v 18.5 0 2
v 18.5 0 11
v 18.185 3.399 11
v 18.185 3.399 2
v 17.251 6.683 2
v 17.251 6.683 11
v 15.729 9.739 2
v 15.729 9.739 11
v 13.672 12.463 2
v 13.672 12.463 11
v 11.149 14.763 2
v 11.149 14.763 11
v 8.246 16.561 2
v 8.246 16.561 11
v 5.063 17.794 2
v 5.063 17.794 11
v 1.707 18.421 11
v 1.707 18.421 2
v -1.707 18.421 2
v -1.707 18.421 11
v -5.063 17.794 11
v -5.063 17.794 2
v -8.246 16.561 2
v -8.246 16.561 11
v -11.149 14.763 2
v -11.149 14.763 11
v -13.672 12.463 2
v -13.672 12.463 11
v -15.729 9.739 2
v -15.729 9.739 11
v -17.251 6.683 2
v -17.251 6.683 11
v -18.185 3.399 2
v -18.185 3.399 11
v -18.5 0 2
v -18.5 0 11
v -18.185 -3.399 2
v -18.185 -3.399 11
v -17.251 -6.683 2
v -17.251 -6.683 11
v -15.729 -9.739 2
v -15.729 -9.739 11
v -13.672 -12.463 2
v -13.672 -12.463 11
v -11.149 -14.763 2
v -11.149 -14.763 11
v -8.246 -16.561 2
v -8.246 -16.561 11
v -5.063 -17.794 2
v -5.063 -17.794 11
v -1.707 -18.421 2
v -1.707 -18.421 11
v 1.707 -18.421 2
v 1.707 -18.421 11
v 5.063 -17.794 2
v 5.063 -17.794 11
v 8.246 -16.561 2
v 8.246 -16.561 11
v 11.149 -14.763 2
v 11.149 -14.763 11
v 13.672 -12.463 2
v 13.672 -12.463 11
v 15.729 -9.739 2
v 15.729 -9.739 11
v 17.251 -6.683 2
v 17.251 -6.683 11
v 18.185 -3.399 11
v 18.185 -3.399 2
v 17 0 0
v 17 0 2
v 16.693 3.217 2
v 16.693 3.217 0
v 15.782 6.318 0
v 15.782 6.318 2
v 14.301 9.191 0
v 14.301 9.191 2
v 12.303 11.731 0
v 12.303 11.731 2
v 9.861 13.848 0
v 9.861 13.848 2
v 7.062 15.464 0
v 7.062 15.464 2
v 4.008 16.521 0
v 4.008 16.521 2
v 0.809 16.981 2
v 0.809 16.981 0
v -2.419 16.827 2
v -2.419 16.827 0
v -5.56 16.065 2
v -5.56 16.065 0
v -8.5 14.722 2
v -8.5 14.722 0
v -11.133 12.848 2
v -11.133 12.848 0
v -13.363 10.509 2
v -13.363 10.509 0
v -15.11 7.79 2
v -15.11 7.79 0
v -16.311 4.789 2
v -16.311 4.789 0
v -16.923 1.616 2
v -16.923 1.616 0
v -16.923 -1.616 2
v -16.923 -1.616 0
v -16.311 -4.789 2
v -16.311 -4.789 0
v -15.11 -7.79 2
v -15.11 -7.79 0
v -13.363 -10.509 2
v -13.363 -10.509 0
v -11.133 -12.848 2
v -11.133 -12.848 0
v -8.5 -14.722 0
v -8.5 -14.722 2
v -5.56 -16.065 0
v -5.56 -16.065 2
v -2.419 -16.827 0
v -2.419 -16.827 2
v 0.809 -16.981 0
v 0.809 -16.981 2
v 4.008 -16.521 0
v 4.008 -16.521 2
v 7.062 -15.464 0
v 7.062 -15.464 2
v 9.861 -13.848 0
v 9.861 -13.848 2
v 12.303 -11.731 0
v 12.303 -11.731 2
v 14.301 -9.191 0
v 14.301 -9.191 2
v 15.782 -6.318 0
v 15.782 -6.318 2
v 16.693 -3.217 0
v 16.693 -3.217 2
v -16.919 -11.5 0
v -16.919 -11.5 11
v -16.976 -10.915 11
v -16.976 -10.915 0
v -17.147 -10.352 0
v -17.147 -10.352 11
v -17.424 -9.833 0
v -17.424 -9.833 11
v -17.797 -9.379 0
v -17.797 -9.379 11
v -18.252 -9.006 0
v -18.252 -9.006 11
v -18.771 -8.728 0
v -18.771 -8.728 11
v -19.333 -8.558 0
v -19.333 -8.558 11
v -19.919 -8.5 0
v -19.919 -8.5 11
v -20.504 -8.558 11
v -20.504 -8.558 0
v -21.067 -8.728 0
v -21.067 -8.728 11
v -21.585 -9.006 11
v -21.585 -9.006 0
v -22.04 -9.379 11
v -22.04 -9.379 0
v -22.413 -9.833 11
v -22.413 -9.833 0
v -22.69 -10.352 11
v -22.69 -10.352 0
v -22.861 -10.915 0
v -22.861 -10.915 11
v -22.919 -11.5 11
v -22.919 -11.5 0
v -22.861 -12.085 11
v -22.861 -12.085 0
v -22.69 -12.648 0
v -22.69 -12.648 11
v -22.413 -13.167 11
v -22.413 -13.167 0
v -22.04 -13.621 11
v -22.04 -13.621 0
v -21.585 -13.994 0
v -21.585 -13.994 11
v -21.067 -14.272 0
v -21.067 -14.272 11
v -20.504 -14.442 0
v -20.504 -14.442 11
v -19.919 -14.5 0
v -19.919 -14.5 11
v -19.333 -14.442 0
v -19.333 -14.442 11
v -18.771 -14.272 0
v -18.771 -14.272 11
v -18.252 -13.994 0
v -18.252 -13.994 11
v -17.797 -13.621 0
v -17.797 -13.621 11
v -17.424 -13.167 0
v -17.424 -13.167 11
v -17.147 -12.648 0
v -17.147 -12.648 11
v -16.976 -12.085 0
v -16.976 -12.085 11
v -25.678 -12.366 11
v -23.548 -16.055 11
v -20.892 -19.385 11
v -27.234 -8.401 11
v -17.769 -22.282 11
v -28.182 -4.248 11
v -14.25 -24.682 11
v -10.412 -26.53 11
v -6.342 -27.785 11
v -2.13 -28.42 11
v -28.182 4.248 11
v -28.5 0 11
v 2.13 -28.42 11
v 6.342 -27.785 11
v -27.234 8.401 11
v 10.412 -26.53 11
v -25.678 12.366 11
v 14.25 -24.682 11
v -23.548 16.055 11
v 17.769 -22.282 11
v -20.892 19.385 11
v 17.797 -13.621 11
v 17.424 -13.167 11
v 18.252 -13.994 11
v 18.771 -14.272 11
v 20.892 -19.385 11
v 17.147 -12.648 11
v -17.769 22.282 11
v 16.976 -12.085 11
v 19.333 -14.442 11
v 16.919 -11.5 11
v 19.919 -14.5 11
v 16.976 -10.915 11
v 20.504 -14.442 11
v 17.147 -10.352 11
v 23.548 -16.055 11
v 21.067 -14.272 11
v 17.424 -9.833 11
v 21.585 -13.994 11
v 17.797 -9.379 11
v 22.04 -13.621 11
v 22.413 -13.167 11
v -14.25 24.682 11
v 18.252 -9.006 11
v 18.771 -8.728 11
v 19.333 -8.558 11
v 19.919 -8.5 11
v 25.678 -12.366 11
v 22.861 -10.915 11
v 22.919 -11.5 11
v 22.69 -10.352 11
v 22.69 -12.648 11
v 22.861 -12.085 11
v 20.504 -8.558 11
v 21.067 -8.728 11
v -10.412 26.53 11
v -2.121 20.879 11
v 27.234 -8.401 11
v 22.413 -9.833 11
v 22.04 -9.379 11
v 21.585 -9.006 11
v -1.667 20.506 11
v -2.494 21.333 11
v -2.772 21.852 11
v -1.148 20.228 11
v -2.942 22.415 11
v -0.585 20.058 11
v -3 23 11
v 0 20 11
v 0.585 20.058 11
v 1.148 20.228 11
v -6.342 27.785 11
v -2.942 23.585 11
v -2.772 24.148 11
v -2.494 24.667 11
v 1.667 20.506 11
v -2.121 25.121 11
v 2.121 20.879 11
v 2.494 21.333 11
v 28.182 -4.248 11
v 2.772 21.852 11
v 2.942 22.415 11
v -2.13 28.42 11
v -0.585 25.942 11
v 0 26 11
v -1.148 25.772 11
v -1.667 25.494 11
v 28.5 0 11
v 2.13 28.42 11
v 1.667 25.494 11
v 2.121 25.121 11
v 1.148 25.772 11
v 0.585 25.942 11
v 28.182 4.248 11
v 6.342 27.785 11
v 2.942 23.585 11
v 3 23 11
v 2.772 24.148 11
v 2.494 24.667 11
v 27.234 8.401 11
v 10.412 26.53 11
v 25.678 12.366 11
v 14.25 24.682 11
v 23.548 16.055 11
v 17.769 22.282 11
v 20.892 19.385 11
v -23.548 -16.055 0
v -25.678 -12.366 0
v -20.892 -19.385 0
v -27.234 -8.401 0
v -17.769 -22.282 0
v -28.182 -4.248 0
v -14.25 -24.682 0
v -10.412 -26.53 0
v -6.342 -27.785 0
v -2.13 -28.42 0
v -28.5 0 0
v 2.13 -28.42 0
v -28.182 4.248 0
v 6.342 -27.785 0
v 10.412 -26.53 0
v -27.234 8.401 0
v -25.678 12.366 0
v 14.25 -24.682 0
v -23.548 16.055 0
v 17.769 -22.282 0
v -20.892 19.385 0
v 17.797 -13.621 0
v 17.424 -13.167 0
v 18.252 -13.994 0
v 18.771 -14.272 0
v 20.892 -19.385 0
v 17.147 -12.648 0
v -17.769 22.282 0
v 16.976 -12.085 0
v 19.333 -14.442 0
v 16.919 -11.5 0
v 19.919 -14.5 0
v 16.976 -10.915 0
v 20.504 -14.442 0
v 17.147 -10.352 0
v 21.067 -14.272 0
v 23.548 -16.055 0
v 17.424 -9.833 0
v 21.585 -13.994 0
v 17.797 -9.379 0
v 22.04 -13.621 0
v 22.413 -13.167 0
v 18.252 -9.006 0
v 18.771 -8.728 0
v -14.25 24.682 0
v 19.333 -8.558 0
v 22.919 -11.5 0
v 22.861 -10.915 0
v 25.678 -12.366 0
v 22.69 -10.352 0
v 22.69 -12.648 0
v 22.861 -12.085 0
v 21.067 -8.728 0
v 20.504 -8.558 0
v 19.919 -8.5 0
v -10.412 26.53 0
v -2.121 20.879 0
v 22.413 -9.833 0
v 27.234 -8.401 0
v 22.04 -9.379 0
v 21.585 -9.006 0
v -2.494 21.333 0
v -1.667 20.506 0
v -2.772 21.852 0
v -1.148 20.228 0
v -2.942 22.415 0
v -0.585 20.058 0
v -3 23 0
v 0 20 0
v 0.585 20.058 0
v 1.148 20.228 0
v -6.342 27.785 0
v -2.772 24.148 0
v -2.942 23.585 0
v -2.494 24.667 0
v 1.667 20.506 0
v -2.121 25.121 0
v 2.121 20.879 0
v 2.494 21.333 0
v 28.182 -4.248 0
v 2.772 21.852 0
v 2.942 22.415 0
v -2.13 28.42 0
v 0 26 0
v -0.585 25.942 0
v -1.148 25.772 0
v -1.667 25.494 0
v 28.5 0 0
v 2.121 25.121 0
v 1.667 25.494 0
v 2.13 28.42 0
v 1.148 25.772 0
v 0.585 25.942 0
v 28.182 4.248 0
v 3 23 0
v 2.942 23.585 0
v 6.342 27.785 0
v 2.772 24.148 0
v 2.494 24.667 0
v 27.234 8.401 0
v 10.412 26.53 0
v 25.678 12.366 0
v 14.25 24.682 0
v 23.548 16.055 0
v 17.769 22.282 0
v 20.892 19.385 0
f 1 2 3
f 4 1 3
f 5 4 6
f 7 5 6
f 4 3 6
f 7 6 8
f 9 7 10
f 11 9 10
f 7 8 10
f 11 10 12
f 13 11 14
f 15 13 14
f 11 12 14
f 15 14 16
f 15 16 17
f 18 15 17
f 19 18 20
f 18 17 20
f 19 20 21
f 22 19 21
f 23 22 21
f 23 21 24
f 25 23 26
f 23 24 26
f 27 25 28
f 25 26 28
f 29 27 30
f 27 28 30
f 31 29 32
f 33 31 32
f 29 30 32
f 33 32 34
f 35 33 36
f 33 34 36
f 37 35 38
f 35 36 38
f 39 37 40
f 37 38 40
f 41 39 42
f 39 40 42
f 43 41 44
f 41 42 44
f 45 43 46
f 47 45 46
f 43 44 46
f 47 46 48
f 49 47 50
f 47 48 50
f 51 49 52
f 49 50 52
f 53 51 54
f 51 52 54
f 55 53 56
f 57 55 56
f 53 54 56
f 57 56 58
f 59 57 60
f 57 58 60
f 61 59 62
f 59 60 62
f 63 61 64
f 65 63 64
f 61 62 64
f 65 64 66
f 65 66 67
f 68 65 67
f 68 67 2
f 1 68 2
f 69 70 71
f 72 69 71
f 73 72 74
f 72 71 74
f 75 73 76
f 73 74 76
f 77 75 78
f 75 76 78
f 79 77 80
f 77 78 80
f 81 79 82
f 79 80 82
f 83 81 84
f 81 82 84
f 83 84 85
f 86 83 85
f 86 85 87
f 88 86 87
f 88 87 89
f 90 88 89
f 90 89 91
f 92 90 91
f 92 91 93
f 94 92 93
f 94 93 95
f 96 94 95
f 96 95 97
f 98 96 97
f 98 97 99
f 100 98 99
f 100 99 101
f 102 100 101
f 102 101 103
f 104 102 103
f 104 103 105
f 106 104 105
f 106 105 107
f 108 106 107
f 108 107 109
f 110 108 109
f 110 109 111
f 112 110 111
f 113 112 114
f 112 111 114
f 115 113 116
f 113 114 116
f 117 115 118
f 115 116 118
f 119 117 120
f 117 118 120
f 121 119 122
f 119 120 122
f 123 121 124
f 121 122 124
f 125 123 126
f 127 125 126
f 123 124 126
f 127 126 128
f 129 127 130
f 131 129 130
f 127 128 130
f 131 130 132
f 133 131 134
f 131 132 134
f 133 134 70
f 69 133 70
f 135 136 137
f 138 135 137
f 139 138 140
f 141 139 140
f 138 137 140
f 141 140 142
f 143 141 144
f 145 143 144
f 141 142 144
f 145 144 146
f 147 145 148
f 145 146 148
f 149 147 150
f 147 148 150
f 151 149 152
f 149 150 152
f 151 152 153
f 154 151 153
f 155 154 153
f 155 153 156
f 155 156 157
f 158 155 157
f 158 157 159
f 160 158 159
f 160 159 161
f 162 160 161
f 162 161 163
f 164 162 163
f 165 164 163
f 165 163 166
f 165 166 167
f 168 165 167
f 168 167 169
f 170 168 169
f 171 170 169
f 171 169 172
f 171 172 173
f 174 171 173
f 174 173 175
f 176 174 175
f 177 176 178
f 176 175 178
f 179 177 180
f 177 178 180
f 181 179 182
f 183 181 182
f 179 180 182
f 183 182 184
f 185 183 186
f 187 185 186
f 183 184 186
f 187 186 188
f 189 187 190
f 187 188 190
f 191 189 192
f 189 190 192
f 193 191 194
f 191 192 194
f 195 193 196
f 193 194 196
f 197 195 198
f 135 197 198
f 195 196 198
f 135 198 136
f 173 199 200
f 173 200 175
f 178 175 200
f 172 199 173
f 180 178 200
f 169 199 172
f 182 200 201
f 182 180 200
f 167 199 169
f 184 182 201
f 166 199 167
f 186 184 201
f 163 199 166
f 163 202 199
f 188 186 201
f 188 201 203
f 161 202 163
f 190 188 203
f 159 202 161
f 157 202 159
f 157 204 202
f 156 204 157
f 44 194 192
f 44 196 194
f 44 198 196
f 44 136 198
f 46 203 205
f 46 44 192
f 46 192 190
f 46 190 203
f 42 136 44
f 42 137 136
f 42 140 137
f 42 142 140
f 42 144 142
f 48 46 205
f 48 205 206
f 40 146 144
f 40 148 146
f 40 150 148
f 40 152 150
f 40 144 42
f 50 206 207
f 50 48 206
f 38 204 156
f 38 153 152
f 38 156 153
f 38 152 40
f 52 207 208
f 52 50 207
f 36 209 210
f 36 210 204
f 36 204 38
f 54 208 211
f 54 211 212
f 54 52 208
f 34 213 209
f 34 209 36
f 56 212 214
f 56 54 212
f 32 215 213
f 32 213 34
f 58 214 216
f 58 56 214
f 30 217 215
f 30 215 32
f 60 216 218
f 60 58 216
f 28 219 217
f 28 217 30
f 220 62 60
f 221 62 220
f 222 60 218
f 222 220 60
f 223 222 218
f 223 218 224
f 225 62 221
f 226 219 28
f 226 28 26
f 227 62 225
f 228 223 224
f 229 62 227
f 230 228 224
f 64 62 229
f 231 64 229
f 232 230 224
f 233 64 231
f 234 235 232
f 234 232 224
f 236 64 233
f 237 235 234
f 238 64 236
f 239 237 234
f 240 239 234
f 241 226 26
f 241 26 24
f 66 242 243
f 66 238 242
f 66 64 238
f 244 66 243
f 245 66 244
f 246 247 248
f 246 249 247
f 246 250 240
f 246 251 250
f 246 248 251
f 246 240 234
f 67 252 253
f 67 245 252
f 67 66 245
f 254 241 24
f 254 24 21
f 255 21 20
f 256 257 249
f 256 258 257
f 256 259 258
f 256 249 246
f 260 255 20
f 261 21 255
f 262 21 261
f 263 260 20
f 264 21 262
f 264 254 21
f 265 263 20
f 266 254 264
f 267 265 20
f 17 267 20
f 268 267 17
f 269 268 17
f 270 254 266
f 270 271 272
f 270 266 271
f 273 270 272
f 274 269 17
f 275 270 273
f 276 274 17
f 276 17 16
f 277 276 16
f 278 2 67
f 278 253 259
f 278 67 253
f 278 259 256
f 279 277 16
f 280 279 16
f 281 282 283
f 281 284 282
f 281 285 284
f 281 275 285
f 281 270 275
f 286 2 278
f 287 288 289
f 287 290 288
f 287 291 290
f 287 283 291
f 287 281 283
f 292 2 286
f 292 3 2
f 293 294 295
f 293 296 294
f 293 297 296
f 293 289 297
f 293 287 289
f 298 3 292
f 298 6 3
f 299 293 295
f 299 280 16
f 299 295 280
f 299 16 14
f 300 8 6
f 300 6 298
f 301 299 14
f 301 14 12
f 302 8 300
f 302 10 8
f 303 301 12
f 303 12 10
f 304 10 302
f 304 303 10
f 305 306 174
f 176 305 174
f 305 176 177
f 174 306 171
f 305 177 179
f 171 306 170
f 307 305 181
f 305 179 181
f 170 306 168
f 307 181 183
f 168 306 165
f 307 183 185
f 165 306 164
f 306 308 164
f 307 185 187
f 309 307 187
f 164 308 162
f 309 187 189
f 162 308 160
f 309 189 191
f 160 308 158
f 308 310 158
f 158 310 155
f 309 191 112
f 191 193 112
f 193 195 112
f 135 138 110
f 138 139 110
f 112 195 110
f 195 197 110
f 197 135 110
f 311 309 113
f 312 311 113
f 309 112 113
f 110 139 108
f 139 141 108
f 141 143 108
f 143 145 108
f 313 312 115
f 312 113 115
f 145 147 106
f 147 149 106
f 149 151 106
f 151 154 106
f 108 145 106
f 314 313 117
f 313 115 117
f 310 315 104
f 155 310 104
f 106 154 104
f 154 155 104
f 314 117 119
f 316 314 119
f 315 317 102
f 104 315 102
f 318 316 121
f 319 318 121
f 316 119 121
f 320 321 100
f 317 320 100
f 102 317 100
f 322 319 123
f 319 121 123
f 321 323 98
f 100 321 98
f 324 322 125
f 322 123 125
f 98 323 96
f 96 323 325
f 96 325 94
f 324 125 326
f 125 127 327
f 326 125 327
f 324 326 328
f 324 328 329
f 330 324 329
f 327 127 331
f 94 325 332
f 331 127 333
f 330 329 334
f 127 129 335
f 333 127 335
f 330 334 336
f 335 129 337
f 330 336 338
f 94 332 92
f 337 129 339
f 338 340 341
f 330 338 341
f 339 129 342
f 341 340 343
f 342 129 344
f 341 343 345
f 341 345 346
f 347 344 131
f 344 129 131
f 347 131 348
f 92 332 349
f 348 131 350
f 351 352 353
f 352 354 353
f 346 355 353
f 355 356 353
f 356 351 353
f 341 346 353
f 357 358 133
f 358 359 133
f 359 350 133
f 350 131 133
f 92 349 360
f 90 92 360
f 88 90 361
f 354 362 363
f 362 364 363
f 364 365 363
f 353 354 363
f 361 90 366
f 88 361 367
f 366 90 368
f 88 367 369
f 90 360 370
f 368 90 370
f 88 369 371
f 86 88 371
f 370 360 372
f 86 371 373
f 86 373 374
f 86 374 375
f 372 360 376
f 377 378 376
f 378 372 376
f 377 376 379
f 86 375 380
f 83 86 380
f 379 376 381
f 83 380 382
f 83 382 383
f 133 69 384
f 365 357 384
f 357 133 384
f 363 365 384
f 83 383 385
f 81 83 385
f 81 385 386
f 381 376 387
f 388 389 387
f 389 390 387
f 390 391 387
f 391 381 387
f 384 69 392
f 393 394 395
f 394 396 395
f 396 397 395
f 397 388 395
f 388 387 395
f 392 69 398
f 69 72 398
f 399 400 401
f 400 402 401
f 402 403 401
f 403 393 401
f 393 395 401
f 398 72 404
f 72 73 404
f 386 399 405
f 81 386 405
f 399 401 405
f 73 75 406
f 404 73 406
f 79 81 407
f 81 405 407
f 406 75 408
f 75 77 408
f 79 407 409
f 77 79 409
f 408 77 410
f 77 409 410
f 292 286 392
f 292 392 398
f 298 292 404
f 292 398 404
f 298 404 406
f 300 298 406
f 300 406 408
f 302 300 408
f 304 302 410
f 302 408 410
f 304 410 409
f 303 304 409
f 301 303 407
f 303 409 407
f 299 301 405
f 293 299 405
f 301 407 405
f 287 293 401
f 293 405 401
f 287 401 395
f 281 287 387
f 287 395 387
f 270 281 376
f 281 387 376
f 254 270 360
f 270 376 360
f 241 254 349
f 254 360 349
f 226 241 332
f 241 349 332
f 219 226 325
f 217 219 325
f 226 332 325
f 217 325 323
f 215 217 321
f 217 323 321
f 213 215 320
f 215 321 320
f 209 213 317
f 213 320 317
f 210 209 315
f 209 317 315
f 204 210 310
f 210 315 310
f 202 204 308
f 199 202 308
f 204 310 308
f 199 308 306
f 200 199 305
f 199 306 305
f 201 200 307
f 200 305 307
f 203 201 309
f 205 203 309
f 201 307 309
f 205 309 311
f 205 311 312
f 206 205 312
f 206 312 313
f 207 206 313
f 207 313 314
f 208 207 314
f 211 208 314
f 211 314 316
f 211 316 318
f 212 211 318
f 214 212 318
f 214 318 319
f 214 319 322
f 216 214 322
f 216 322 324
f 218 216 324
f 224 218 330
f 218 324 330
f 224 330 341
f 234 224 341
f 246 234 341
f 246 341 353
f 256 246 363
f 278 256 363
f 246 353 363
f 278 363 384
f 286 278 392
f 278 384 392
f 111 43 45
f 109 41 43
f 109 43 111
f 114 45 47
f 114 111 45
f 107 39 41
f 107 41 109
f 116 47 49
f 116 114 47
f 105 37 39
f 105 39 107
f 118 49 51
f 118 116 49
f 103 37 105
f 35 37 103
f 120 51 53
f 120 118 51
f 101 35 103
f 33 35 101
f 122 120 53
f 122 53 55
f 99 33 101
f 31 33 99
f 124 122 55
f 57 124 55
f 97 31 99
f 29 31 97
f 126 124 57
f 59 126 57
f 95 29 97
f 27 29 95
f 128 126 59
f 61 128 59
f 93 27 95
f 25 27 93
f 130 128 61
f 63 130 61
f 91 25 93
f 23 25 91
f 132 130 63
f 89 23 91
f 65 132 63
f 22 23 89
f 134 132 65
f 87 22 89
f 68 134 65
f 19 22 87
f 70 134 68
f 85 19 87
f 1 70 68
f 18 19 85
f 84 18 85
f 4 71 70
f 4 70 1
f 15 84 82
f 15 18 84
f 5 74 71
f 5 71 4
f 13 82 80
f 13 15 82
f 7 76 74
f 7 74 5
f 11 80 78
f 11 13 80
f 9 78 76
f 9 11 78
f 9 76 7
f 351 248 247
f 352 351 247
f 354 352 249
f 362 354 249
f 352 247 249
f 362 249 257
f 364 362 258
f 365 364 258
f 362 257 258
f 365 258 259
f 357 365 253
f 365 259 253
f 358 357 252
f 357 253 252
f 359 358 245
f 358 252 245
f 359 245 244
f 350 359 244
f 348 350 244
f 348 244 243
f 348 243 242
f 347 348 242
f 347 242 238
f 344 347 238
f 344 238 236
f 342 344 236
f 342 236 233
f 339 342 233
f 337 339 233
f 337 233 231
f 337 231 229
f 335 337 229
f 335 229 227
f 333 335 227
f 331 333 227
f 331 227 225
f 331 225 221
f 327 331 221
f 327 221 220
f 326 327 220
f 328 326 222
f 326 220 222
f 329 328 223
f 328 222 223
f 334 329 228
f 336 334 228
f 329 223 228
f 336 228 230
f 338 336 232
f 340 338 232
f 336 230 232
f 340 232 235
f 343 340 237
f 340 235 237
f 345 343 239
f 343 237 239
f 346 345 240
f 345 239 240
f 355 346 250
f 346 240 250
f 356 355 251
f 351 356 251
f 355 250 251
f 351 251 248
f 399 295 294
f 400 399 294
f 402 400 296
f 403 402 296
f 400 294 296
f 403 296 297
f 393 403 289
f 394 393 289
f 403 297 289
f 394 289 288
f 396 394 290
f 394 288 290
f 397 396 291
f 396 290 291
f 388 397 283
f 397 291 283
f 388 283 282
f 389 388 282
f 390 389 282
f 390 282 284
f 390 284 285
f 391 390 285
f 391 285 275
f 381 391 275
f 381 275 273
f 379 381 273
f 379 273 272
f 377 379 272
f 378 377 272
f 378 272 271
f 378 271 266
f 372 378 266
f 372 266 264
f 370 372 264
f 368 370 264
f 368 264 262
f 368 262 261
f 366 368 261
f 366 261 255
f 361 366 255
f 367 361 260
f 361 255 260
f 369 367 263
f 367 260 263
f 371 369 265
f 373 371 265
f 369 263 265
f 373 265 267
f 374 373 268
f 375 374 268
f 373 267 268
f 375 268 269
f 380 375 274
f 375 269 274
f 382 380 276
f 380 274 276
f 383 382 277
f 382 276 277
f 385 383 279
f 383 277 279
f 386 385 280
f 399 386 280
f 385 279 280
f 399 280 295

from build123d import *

# Parameters (mm, degrees)
SKETCH_1_R          = 28.5
EXTRUDE_1_DEPTH     = 11
SKETCH_3_R          = 18.5
CUT_EXTRUDE_1_DEPTH = 9
SKETCH_4_R          = 17
CUT_EXTRUDE_2_DEPTH = 3
SKETCH_5_R          = 3
CUT_EXTRUDE_3_DEPTH = 12


with BuildPart() as part:
    # 草图1 → 凸台-拉伸1 (new body)
    with BuildSketch(Plane.XY):
        Circle(SKETCH_1_R)
    extrude(amount=EXTRUDE_1_DEPTH)

    # 草图3 → 切除-拉伸1 (cut)
    with BuildSketch(Plane.XY.offset(11)):
        Circle(SKETCH_3_R)
    extrude(amount=-CUT_EXTRUDE_1_DEPTH, mode=Mode.SUBTRACT)

    # 草图4 → 切除-拉伸2 (cut, through all)
    with BuildSketch(Plane.XY.offset(2)):
        Circle(SKETCH_4_R)
    extrude(amount=-CUT_EXTRUDE_2_DEPTH, mode=Mode.SUBTRACT)

    # 草图5 → 切除-拉伸3 (cut, through all)
    with BuildSketch(Plane.XY.offset(11)):
        with Locations((0, 23)):
            Circle(SKETCH_5_R)
        with Locations((19.918584287, -11.5)):
            Circle(SKETCH_5_R)
        with Locations((-19.918584287, -11.5)):
            Circle(SKETCH_5_R)
    extrude(amount=-CUT_EXTRUDE_3_DEPTH, mode=Mode.SUBTRACT)


solid = part.part
